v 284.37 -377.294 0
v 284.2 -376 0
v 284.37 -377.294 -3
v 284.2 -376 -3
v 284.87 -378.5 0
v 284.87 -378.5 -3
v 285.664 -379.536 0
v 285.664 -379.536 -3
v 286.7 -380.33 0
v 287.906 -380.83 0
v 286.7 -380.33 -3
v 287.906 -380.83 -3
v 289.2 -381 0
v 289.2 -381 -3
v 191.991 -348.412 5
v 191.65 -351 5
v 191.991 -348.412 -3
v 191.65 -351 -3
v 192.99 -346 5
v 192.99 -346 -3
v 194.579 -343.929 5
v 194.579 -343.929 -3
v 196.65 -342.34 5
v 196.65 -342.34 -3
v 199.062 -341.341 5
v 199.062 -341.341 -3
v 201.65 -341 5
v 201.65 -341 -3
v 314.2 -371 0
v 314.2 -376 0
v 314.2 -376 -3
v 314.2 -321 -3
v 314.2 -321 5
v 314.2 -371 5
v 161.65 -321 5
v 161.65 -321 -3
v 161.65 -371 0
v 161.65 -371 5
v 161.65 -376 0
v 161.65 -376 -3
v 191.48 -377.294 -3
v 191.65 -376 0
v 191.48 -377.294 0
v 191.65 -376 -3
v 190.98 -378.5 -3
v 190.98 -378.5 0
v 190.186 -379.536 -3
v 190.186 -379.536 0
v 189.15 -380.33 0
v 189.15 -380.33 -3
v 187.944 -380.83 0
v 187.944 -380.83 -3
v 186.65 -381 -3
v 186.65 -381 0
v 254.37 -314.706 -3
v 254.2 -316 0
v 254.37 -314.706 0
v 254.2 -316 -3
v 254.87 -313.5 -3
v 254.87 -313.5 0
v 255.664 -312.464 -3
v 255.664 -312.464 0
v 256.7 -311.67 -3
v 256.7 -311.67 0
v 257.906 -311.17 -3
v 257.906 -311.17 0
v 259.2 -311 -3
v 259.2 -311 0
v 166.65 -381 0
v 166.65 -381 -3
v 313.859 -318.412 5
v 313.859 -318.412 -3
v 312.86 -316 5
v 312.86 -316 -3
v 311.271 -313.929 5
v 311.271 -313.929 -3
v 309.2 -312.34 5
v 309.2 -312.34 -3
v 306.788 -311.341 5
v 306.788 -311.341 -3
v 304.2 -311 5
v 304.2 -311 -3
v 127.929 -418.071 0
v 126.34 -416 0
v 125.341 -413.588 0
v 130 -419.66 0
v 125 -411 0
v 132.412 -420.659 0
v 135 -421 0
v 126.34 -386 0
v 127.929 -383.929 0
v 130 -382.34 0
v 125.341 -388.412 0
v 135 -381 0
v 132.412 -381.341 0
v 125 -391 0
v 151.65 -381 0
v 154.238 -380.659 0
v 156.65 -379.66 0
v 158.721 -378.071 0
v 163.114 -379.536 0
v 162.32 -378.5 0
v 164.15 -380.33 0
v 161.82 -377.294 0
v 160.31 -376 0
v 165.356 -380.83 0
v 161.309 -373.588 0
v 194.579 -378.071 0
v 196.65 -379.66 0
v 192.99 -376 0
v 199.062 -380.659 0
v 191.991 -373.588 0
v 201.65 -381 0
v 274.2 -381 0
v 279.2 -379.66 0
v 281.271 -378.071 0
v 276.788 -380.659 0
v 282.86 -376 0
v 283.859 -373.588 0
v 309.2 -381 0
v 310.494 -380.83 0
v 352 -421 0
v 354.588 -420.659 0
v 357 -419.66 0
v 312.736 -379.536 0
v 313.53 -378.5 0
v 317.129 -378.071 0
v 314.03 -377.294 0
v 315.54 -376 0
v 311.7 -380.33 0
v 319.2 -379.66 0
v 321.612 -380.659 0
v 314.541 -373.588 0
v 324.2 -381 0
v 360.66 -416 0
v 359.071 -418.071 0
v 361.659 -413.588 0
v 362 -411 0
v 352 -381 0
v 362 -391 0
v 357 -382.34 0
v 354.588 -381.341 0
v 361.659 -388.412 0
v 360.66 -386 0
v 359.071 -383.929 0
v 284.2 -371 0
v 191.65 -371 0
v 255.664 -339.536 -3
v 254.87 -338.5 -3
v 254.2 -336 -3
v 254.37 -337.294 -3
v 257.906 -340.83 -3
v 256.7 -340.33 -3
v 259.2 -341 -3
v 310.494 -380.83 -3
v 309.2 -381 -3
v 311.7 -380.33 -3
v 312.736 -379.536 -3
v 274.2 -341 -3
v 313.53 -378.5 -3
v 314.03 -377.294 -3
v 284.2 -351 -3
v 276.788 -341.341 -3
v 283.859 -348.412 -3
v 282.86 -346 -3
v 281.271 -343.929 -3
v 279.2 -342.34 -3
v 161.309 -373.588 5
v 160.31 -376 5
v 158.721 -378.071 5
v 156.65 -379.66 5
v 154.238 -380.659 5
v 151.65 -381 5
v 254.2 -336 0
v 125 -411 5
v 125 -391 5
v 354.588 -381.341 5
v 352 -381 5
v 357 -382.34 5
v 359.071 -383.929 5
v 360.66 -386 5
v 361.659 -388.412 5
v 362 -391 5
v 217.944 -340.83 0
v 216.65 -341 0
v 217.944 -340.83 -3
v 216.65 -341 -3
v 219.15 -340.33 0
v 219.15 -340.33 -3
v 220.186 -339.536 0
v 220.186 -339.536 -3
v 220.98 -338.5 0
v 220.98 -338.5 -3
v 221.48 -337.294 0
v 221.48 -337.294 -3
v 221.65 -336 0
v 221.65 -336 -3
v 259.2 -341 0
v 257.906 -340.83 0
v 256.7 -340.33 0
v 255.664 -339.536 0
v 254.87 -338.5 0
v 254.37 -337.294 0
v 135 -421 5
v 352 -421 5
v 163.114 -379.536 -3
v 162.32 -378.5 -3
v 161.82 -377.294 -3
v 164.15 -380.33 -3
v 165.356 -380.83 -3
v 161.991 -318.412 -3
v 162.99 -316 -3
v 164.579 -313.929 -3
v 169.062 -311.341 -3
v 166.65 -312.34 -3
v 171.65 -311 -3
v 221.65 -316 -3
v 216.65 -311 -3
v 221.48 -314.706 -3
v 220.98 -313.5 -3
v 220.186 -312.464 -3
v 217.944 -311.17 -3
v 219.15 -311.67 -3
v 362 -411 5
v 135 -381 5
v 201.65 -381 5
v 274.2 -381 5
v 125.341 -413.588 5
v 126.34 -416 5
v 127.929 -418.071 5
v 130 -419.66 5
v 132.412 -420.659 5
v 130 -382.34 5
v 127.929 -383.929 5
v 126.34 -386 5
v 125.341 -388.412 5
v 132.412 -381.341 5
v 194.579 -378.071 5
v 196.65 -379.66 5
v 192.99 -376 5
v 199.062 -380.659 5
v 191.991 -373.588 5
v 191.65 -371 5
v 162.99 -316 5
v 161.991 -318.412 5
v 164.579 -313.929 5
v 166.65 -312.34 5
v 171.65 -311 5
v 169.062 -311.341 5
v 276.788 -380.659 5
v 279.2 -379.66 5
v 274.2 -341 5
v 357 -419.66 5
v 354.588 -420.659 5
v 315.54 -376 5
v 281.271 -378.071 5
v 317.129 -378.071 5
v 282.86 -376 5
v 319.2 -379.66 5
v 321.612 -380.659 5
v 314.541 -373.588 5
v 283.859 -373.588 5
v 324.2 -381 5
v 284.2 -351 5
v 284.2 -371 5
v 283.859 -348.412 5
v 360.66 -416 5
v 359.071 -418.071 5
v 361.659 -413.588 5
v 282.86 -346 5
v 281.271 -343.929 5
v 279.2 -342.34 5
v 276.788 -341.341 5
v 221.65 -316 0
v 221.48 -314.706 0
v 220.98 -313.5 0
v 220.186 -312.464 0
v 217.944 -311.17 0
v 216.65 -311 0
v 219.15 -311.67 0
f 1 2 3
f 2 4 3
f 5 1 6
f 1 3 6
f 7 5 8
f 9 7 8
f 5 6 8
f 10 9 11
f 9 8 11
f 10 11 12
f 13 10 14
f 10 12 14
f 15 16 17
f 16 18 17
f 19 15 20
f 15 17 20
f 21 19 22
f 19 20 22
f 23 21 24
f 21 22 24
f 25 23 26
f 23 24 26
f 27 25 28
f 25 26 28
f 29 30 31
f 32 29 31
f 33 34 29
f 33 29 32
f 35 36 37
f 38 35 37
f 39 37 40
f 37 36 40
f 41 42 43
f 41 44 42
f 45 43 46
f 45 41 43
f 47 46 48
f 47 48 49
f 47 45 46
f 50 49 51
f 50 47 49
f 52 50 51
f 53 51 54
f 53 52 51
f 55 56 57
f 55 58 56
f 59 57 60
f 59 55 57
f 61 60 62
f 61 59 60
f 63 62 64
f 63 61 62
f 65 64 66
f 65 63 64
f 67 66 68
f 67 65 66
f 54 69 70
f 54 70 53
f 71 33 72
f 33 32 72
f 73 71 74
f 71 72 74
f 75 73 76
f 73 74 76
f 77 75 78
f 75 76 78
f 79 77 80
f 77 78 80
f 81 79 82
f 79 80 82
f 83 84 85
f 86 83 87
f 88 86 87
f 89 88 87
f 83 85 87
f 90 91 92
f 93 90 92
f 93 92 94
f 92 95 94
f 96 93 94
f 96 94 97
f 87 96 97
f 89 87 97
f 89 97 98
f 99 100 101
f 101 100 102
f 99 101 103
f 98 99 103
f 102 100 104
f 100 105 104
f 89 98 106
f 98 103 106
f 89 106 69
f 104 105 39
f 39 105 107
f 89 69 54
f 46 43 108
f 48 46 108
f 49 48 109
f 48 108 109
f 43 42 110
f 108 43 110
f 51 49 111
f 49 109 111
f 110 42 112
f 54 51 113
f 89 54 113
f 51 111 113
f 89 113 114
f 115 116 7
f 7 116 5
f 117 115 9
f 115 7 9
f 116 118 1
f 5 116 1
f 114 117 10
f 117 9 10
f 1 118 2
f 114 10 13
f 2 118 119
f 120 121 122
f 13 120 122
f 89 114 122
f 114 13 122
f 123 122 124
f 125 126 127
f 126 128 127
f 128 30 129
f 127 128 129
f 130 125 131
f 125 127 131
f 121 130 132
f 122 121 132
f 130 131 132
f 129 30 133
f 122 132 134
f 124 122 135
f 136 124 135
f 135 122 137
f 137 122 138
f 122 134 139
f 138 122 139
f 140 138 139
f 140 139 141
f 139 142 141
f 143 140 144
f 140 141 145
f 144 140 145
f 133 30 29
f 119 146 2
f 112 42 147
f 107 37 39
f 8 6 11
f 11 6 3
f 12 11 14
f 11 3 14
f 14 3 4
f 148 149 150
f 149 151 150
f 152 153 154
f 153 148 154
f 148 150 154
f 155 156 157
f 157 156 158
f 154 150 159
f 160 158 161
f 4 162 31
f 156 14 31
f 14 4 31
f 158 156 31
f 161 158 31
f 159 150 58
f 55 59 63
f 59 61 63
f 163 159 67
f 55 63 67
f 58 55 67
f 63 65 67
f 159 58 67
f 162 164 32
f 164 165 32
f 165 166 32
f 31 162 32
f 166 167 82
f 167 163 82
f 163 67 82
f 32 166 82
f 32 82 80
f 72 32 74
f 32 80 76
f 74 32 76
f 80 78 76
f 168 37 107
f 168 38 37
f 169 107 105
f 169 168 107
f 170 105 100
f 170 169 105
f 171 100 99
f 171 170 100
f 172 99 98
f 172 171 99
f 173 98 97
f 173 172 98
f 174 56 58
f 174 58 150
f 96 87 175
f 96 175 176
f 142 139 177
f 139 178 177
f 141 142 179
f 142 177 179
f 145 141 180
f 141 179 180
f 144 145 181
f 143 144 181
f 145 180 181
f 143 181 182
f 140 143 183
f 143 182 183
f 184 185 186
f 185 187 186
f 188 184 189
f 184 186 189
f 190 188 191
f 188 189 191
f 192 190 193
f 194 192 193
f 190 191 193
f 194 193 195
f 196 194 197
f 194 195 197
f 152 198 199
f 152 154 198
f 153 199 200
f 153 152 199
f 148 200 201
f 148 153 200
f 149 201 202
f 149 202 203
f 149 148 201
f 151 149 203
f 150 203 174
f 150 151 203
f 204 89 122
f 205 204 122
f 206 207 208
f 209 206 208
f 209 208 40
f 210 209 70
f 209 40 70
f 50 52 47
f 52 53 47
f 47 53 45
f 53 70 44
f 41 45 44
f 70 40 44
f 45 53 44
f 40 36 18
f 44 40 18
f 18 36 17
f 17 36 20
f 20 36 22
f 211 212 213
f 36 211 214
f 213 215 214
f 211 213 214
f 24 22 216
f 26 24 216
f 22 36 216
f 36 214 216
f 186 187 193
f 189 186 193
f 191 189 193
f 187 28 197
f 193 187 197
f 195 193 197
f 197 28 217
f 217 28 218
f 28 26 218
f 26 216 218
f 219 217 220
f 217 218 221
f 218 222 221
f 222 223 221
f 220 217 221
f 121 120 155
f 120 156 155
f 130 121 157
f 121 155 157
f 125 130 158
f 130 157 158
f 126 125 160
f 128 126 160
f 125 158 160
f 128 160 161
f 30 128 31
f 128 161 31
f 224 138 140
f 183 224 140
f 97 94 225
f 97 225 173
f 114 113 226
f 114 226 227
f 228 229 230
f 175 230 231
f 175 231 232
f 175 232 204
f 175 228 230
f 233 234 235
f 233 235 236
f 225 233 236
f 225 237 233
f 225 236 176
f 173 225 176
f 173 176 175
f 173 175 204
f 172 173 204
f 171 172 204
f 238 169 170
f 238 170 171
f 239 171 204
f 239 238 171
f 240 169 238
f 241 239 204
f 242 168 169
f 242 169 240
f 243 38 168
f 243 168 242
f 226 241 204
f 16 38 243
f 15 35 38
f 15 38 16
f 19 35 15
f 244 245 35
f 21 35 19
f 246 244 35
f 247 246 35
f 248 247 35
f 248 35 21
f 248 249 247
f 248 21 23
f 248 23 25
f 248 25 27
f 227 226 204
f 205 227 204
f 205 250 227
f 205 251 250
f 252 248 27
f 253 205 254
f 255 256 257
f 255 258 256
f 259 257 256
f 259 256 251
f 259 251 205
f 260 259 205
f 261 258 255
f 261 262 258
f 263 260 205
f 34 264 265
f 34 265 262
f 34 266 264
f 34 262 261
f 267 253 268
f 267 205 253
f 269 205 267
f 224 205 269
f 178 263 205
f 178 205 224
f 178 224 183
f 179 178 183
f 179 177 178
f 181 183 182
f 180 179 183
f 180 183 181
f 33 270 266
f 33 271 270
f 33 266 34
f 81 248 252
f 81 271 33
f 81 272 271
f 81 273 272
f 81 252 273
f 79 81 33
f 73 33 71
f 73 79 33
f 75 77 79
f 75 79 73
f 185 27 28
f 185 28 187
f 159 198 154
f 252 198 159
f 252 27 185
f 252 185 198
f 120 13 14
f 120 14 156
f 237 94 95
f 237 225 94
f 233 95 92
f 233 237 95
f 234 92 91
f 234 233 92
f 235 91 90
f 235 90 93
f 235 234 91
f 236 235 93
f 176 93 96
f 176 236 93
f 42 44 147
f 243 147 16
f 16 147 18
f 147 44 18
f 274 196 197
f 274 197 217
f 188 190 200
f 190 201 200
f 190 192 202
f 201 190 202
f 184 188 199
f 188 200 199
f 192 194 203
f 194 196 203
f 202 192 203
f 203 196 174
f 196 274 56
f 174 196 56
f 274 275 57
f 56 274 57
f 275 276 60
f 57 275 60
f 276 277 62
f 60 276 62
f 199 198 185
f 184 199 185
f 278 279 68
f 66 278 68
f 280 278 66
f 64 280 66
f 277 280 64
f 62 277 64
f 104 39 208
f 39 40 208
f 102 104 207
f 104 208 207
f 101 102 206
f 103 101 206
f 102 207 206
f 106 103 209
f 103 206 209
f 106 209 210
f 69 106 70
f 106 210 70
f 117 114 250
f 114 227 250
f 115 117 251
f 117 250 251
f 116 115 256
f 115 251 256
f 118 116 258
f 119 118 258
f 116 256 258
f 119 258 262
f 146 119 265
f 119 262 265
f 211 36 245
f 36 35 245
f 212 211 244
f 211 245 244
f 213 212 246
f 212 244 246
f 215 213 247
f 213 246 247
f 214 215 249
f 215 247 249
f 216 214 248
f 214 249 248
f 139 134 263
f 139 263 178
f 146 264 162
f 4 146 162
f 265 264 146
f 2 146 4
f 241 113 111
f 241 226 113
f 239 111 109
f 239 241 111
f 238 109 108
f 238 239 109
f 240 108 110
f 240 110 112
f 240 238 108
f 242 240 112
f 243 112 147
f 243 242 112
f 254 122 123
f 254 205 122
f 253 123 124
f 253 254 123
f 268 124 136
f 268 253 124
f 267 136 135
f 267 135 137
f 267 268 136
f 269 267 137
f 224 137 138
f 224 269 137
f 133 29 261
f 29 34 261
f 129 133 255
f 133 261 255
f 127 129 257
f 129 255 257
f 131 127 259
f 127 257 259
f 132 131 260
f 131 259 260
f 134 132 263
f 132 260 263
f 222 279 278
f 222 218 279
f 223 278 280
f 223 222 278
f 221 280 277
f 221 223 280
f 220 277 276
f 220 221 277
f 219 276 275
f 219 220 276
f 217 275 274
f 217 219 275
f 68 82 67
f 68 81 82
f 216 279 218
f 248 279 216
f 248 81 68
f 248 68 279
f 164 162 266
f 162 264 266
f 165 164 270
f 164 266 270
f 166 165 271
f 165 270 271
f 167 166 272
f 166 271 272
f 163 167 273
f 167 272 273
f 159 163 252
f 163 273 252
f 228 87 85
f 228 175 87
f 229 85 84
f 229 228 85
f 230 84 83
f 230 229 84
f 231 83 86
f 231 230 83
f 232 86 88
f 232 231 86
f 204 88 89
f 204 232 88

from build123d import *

# Parameters (mm, degrees)
CROQUIS1_W              = 237
CROQUIS1_H              = 40
CROQUIS1_W_2            = 32.55
CROQUIS1_H_2            = 30
SALIENTE_EXTRUIR1_DEPTH = 5
SALIENTE_EXTRUIR2_DEPTH = 3
REDONDEO1_R             = 10
REDONDEO2_R             = 5


with BuildPart() as part:
    # Croquis1 → Saliente-Extruir1 (new body)
    with BuildSketch(Plane.XY):
        Polygon((254.2, -311), (254.2, -341), (284.2, -341), (284.2, -381), (314.2, -381), (314.2, -311), align=None)
        Polygon((191.65, -341), (221.65, -341), (221.65, -311), (161.65, -311), (161.65, -381), (191.65, -381), align=None)
        with Locations((243.5, -401)):
            Rectangle(CROQUIS1_W, CROQUIS1_H)
        with Locations((237.925, -326)):
            Rectangle(CROQUIS1_W_2, CROQUIS1_H_2)
    extrude(amount=SALIENTE_EXTRUIR1_DEPTH)

    # Croquis1<3> → Saliente-Extruir2 (add)
    with BuildSketch(Plane.XY):
        Polygon((254.2, -311), (254.2, -341), (284.2, -341), (284.2, -381), (314.2, -381), (314.2, -311), align=None)
        Polygon((191.65, -341), (221.65, -341), (221.65, -311), (161.65, -311), (161.65, -381), (191.65, -381), align=None)
    extrude(amount=-SALIENTE_EXTRUIR2_DEPTH)

    # Redondeo1
    redondeo1_edges = [part.edges().sort_by_distance(p)[0] for p in [
        (314.2, -381, 2.5),
        (362, -381, 2.5),
        (362, -421, 2.5),
        (125, -421, 2.5),
        (125, -381, 2.5),
        (161.65, -381, 2.5),
        (161.65, -311, 1),
        (314.2, -311, 1),
        (191.65, -381, 2.5),
        (284.2, -381, 2.5),
        (284.2, -341, 1),
        (191.65, -341, 1),
    ]]
    fillet(redondeo1_edges, radius=REDONDEO1_R)

    # Redondeo2
    redondeo2_edges = [part.edges().sort_by_distance(p)[0] for p in [
        (314.2, -381, -1.5),
        (284.2, -381, -1.5),
        (254.2, -341, -1.5),
        (254.2, -311, -1.5),
        (221.65, -341, -1.5),
        (221.65, -311, -1.5),
        (161.65, -381, -1.5),
        (191.65, -381, -1.5),
    ]]
    fillet(redondeo2_edges, radius=REDONDEO2_R)


solid = part.part
